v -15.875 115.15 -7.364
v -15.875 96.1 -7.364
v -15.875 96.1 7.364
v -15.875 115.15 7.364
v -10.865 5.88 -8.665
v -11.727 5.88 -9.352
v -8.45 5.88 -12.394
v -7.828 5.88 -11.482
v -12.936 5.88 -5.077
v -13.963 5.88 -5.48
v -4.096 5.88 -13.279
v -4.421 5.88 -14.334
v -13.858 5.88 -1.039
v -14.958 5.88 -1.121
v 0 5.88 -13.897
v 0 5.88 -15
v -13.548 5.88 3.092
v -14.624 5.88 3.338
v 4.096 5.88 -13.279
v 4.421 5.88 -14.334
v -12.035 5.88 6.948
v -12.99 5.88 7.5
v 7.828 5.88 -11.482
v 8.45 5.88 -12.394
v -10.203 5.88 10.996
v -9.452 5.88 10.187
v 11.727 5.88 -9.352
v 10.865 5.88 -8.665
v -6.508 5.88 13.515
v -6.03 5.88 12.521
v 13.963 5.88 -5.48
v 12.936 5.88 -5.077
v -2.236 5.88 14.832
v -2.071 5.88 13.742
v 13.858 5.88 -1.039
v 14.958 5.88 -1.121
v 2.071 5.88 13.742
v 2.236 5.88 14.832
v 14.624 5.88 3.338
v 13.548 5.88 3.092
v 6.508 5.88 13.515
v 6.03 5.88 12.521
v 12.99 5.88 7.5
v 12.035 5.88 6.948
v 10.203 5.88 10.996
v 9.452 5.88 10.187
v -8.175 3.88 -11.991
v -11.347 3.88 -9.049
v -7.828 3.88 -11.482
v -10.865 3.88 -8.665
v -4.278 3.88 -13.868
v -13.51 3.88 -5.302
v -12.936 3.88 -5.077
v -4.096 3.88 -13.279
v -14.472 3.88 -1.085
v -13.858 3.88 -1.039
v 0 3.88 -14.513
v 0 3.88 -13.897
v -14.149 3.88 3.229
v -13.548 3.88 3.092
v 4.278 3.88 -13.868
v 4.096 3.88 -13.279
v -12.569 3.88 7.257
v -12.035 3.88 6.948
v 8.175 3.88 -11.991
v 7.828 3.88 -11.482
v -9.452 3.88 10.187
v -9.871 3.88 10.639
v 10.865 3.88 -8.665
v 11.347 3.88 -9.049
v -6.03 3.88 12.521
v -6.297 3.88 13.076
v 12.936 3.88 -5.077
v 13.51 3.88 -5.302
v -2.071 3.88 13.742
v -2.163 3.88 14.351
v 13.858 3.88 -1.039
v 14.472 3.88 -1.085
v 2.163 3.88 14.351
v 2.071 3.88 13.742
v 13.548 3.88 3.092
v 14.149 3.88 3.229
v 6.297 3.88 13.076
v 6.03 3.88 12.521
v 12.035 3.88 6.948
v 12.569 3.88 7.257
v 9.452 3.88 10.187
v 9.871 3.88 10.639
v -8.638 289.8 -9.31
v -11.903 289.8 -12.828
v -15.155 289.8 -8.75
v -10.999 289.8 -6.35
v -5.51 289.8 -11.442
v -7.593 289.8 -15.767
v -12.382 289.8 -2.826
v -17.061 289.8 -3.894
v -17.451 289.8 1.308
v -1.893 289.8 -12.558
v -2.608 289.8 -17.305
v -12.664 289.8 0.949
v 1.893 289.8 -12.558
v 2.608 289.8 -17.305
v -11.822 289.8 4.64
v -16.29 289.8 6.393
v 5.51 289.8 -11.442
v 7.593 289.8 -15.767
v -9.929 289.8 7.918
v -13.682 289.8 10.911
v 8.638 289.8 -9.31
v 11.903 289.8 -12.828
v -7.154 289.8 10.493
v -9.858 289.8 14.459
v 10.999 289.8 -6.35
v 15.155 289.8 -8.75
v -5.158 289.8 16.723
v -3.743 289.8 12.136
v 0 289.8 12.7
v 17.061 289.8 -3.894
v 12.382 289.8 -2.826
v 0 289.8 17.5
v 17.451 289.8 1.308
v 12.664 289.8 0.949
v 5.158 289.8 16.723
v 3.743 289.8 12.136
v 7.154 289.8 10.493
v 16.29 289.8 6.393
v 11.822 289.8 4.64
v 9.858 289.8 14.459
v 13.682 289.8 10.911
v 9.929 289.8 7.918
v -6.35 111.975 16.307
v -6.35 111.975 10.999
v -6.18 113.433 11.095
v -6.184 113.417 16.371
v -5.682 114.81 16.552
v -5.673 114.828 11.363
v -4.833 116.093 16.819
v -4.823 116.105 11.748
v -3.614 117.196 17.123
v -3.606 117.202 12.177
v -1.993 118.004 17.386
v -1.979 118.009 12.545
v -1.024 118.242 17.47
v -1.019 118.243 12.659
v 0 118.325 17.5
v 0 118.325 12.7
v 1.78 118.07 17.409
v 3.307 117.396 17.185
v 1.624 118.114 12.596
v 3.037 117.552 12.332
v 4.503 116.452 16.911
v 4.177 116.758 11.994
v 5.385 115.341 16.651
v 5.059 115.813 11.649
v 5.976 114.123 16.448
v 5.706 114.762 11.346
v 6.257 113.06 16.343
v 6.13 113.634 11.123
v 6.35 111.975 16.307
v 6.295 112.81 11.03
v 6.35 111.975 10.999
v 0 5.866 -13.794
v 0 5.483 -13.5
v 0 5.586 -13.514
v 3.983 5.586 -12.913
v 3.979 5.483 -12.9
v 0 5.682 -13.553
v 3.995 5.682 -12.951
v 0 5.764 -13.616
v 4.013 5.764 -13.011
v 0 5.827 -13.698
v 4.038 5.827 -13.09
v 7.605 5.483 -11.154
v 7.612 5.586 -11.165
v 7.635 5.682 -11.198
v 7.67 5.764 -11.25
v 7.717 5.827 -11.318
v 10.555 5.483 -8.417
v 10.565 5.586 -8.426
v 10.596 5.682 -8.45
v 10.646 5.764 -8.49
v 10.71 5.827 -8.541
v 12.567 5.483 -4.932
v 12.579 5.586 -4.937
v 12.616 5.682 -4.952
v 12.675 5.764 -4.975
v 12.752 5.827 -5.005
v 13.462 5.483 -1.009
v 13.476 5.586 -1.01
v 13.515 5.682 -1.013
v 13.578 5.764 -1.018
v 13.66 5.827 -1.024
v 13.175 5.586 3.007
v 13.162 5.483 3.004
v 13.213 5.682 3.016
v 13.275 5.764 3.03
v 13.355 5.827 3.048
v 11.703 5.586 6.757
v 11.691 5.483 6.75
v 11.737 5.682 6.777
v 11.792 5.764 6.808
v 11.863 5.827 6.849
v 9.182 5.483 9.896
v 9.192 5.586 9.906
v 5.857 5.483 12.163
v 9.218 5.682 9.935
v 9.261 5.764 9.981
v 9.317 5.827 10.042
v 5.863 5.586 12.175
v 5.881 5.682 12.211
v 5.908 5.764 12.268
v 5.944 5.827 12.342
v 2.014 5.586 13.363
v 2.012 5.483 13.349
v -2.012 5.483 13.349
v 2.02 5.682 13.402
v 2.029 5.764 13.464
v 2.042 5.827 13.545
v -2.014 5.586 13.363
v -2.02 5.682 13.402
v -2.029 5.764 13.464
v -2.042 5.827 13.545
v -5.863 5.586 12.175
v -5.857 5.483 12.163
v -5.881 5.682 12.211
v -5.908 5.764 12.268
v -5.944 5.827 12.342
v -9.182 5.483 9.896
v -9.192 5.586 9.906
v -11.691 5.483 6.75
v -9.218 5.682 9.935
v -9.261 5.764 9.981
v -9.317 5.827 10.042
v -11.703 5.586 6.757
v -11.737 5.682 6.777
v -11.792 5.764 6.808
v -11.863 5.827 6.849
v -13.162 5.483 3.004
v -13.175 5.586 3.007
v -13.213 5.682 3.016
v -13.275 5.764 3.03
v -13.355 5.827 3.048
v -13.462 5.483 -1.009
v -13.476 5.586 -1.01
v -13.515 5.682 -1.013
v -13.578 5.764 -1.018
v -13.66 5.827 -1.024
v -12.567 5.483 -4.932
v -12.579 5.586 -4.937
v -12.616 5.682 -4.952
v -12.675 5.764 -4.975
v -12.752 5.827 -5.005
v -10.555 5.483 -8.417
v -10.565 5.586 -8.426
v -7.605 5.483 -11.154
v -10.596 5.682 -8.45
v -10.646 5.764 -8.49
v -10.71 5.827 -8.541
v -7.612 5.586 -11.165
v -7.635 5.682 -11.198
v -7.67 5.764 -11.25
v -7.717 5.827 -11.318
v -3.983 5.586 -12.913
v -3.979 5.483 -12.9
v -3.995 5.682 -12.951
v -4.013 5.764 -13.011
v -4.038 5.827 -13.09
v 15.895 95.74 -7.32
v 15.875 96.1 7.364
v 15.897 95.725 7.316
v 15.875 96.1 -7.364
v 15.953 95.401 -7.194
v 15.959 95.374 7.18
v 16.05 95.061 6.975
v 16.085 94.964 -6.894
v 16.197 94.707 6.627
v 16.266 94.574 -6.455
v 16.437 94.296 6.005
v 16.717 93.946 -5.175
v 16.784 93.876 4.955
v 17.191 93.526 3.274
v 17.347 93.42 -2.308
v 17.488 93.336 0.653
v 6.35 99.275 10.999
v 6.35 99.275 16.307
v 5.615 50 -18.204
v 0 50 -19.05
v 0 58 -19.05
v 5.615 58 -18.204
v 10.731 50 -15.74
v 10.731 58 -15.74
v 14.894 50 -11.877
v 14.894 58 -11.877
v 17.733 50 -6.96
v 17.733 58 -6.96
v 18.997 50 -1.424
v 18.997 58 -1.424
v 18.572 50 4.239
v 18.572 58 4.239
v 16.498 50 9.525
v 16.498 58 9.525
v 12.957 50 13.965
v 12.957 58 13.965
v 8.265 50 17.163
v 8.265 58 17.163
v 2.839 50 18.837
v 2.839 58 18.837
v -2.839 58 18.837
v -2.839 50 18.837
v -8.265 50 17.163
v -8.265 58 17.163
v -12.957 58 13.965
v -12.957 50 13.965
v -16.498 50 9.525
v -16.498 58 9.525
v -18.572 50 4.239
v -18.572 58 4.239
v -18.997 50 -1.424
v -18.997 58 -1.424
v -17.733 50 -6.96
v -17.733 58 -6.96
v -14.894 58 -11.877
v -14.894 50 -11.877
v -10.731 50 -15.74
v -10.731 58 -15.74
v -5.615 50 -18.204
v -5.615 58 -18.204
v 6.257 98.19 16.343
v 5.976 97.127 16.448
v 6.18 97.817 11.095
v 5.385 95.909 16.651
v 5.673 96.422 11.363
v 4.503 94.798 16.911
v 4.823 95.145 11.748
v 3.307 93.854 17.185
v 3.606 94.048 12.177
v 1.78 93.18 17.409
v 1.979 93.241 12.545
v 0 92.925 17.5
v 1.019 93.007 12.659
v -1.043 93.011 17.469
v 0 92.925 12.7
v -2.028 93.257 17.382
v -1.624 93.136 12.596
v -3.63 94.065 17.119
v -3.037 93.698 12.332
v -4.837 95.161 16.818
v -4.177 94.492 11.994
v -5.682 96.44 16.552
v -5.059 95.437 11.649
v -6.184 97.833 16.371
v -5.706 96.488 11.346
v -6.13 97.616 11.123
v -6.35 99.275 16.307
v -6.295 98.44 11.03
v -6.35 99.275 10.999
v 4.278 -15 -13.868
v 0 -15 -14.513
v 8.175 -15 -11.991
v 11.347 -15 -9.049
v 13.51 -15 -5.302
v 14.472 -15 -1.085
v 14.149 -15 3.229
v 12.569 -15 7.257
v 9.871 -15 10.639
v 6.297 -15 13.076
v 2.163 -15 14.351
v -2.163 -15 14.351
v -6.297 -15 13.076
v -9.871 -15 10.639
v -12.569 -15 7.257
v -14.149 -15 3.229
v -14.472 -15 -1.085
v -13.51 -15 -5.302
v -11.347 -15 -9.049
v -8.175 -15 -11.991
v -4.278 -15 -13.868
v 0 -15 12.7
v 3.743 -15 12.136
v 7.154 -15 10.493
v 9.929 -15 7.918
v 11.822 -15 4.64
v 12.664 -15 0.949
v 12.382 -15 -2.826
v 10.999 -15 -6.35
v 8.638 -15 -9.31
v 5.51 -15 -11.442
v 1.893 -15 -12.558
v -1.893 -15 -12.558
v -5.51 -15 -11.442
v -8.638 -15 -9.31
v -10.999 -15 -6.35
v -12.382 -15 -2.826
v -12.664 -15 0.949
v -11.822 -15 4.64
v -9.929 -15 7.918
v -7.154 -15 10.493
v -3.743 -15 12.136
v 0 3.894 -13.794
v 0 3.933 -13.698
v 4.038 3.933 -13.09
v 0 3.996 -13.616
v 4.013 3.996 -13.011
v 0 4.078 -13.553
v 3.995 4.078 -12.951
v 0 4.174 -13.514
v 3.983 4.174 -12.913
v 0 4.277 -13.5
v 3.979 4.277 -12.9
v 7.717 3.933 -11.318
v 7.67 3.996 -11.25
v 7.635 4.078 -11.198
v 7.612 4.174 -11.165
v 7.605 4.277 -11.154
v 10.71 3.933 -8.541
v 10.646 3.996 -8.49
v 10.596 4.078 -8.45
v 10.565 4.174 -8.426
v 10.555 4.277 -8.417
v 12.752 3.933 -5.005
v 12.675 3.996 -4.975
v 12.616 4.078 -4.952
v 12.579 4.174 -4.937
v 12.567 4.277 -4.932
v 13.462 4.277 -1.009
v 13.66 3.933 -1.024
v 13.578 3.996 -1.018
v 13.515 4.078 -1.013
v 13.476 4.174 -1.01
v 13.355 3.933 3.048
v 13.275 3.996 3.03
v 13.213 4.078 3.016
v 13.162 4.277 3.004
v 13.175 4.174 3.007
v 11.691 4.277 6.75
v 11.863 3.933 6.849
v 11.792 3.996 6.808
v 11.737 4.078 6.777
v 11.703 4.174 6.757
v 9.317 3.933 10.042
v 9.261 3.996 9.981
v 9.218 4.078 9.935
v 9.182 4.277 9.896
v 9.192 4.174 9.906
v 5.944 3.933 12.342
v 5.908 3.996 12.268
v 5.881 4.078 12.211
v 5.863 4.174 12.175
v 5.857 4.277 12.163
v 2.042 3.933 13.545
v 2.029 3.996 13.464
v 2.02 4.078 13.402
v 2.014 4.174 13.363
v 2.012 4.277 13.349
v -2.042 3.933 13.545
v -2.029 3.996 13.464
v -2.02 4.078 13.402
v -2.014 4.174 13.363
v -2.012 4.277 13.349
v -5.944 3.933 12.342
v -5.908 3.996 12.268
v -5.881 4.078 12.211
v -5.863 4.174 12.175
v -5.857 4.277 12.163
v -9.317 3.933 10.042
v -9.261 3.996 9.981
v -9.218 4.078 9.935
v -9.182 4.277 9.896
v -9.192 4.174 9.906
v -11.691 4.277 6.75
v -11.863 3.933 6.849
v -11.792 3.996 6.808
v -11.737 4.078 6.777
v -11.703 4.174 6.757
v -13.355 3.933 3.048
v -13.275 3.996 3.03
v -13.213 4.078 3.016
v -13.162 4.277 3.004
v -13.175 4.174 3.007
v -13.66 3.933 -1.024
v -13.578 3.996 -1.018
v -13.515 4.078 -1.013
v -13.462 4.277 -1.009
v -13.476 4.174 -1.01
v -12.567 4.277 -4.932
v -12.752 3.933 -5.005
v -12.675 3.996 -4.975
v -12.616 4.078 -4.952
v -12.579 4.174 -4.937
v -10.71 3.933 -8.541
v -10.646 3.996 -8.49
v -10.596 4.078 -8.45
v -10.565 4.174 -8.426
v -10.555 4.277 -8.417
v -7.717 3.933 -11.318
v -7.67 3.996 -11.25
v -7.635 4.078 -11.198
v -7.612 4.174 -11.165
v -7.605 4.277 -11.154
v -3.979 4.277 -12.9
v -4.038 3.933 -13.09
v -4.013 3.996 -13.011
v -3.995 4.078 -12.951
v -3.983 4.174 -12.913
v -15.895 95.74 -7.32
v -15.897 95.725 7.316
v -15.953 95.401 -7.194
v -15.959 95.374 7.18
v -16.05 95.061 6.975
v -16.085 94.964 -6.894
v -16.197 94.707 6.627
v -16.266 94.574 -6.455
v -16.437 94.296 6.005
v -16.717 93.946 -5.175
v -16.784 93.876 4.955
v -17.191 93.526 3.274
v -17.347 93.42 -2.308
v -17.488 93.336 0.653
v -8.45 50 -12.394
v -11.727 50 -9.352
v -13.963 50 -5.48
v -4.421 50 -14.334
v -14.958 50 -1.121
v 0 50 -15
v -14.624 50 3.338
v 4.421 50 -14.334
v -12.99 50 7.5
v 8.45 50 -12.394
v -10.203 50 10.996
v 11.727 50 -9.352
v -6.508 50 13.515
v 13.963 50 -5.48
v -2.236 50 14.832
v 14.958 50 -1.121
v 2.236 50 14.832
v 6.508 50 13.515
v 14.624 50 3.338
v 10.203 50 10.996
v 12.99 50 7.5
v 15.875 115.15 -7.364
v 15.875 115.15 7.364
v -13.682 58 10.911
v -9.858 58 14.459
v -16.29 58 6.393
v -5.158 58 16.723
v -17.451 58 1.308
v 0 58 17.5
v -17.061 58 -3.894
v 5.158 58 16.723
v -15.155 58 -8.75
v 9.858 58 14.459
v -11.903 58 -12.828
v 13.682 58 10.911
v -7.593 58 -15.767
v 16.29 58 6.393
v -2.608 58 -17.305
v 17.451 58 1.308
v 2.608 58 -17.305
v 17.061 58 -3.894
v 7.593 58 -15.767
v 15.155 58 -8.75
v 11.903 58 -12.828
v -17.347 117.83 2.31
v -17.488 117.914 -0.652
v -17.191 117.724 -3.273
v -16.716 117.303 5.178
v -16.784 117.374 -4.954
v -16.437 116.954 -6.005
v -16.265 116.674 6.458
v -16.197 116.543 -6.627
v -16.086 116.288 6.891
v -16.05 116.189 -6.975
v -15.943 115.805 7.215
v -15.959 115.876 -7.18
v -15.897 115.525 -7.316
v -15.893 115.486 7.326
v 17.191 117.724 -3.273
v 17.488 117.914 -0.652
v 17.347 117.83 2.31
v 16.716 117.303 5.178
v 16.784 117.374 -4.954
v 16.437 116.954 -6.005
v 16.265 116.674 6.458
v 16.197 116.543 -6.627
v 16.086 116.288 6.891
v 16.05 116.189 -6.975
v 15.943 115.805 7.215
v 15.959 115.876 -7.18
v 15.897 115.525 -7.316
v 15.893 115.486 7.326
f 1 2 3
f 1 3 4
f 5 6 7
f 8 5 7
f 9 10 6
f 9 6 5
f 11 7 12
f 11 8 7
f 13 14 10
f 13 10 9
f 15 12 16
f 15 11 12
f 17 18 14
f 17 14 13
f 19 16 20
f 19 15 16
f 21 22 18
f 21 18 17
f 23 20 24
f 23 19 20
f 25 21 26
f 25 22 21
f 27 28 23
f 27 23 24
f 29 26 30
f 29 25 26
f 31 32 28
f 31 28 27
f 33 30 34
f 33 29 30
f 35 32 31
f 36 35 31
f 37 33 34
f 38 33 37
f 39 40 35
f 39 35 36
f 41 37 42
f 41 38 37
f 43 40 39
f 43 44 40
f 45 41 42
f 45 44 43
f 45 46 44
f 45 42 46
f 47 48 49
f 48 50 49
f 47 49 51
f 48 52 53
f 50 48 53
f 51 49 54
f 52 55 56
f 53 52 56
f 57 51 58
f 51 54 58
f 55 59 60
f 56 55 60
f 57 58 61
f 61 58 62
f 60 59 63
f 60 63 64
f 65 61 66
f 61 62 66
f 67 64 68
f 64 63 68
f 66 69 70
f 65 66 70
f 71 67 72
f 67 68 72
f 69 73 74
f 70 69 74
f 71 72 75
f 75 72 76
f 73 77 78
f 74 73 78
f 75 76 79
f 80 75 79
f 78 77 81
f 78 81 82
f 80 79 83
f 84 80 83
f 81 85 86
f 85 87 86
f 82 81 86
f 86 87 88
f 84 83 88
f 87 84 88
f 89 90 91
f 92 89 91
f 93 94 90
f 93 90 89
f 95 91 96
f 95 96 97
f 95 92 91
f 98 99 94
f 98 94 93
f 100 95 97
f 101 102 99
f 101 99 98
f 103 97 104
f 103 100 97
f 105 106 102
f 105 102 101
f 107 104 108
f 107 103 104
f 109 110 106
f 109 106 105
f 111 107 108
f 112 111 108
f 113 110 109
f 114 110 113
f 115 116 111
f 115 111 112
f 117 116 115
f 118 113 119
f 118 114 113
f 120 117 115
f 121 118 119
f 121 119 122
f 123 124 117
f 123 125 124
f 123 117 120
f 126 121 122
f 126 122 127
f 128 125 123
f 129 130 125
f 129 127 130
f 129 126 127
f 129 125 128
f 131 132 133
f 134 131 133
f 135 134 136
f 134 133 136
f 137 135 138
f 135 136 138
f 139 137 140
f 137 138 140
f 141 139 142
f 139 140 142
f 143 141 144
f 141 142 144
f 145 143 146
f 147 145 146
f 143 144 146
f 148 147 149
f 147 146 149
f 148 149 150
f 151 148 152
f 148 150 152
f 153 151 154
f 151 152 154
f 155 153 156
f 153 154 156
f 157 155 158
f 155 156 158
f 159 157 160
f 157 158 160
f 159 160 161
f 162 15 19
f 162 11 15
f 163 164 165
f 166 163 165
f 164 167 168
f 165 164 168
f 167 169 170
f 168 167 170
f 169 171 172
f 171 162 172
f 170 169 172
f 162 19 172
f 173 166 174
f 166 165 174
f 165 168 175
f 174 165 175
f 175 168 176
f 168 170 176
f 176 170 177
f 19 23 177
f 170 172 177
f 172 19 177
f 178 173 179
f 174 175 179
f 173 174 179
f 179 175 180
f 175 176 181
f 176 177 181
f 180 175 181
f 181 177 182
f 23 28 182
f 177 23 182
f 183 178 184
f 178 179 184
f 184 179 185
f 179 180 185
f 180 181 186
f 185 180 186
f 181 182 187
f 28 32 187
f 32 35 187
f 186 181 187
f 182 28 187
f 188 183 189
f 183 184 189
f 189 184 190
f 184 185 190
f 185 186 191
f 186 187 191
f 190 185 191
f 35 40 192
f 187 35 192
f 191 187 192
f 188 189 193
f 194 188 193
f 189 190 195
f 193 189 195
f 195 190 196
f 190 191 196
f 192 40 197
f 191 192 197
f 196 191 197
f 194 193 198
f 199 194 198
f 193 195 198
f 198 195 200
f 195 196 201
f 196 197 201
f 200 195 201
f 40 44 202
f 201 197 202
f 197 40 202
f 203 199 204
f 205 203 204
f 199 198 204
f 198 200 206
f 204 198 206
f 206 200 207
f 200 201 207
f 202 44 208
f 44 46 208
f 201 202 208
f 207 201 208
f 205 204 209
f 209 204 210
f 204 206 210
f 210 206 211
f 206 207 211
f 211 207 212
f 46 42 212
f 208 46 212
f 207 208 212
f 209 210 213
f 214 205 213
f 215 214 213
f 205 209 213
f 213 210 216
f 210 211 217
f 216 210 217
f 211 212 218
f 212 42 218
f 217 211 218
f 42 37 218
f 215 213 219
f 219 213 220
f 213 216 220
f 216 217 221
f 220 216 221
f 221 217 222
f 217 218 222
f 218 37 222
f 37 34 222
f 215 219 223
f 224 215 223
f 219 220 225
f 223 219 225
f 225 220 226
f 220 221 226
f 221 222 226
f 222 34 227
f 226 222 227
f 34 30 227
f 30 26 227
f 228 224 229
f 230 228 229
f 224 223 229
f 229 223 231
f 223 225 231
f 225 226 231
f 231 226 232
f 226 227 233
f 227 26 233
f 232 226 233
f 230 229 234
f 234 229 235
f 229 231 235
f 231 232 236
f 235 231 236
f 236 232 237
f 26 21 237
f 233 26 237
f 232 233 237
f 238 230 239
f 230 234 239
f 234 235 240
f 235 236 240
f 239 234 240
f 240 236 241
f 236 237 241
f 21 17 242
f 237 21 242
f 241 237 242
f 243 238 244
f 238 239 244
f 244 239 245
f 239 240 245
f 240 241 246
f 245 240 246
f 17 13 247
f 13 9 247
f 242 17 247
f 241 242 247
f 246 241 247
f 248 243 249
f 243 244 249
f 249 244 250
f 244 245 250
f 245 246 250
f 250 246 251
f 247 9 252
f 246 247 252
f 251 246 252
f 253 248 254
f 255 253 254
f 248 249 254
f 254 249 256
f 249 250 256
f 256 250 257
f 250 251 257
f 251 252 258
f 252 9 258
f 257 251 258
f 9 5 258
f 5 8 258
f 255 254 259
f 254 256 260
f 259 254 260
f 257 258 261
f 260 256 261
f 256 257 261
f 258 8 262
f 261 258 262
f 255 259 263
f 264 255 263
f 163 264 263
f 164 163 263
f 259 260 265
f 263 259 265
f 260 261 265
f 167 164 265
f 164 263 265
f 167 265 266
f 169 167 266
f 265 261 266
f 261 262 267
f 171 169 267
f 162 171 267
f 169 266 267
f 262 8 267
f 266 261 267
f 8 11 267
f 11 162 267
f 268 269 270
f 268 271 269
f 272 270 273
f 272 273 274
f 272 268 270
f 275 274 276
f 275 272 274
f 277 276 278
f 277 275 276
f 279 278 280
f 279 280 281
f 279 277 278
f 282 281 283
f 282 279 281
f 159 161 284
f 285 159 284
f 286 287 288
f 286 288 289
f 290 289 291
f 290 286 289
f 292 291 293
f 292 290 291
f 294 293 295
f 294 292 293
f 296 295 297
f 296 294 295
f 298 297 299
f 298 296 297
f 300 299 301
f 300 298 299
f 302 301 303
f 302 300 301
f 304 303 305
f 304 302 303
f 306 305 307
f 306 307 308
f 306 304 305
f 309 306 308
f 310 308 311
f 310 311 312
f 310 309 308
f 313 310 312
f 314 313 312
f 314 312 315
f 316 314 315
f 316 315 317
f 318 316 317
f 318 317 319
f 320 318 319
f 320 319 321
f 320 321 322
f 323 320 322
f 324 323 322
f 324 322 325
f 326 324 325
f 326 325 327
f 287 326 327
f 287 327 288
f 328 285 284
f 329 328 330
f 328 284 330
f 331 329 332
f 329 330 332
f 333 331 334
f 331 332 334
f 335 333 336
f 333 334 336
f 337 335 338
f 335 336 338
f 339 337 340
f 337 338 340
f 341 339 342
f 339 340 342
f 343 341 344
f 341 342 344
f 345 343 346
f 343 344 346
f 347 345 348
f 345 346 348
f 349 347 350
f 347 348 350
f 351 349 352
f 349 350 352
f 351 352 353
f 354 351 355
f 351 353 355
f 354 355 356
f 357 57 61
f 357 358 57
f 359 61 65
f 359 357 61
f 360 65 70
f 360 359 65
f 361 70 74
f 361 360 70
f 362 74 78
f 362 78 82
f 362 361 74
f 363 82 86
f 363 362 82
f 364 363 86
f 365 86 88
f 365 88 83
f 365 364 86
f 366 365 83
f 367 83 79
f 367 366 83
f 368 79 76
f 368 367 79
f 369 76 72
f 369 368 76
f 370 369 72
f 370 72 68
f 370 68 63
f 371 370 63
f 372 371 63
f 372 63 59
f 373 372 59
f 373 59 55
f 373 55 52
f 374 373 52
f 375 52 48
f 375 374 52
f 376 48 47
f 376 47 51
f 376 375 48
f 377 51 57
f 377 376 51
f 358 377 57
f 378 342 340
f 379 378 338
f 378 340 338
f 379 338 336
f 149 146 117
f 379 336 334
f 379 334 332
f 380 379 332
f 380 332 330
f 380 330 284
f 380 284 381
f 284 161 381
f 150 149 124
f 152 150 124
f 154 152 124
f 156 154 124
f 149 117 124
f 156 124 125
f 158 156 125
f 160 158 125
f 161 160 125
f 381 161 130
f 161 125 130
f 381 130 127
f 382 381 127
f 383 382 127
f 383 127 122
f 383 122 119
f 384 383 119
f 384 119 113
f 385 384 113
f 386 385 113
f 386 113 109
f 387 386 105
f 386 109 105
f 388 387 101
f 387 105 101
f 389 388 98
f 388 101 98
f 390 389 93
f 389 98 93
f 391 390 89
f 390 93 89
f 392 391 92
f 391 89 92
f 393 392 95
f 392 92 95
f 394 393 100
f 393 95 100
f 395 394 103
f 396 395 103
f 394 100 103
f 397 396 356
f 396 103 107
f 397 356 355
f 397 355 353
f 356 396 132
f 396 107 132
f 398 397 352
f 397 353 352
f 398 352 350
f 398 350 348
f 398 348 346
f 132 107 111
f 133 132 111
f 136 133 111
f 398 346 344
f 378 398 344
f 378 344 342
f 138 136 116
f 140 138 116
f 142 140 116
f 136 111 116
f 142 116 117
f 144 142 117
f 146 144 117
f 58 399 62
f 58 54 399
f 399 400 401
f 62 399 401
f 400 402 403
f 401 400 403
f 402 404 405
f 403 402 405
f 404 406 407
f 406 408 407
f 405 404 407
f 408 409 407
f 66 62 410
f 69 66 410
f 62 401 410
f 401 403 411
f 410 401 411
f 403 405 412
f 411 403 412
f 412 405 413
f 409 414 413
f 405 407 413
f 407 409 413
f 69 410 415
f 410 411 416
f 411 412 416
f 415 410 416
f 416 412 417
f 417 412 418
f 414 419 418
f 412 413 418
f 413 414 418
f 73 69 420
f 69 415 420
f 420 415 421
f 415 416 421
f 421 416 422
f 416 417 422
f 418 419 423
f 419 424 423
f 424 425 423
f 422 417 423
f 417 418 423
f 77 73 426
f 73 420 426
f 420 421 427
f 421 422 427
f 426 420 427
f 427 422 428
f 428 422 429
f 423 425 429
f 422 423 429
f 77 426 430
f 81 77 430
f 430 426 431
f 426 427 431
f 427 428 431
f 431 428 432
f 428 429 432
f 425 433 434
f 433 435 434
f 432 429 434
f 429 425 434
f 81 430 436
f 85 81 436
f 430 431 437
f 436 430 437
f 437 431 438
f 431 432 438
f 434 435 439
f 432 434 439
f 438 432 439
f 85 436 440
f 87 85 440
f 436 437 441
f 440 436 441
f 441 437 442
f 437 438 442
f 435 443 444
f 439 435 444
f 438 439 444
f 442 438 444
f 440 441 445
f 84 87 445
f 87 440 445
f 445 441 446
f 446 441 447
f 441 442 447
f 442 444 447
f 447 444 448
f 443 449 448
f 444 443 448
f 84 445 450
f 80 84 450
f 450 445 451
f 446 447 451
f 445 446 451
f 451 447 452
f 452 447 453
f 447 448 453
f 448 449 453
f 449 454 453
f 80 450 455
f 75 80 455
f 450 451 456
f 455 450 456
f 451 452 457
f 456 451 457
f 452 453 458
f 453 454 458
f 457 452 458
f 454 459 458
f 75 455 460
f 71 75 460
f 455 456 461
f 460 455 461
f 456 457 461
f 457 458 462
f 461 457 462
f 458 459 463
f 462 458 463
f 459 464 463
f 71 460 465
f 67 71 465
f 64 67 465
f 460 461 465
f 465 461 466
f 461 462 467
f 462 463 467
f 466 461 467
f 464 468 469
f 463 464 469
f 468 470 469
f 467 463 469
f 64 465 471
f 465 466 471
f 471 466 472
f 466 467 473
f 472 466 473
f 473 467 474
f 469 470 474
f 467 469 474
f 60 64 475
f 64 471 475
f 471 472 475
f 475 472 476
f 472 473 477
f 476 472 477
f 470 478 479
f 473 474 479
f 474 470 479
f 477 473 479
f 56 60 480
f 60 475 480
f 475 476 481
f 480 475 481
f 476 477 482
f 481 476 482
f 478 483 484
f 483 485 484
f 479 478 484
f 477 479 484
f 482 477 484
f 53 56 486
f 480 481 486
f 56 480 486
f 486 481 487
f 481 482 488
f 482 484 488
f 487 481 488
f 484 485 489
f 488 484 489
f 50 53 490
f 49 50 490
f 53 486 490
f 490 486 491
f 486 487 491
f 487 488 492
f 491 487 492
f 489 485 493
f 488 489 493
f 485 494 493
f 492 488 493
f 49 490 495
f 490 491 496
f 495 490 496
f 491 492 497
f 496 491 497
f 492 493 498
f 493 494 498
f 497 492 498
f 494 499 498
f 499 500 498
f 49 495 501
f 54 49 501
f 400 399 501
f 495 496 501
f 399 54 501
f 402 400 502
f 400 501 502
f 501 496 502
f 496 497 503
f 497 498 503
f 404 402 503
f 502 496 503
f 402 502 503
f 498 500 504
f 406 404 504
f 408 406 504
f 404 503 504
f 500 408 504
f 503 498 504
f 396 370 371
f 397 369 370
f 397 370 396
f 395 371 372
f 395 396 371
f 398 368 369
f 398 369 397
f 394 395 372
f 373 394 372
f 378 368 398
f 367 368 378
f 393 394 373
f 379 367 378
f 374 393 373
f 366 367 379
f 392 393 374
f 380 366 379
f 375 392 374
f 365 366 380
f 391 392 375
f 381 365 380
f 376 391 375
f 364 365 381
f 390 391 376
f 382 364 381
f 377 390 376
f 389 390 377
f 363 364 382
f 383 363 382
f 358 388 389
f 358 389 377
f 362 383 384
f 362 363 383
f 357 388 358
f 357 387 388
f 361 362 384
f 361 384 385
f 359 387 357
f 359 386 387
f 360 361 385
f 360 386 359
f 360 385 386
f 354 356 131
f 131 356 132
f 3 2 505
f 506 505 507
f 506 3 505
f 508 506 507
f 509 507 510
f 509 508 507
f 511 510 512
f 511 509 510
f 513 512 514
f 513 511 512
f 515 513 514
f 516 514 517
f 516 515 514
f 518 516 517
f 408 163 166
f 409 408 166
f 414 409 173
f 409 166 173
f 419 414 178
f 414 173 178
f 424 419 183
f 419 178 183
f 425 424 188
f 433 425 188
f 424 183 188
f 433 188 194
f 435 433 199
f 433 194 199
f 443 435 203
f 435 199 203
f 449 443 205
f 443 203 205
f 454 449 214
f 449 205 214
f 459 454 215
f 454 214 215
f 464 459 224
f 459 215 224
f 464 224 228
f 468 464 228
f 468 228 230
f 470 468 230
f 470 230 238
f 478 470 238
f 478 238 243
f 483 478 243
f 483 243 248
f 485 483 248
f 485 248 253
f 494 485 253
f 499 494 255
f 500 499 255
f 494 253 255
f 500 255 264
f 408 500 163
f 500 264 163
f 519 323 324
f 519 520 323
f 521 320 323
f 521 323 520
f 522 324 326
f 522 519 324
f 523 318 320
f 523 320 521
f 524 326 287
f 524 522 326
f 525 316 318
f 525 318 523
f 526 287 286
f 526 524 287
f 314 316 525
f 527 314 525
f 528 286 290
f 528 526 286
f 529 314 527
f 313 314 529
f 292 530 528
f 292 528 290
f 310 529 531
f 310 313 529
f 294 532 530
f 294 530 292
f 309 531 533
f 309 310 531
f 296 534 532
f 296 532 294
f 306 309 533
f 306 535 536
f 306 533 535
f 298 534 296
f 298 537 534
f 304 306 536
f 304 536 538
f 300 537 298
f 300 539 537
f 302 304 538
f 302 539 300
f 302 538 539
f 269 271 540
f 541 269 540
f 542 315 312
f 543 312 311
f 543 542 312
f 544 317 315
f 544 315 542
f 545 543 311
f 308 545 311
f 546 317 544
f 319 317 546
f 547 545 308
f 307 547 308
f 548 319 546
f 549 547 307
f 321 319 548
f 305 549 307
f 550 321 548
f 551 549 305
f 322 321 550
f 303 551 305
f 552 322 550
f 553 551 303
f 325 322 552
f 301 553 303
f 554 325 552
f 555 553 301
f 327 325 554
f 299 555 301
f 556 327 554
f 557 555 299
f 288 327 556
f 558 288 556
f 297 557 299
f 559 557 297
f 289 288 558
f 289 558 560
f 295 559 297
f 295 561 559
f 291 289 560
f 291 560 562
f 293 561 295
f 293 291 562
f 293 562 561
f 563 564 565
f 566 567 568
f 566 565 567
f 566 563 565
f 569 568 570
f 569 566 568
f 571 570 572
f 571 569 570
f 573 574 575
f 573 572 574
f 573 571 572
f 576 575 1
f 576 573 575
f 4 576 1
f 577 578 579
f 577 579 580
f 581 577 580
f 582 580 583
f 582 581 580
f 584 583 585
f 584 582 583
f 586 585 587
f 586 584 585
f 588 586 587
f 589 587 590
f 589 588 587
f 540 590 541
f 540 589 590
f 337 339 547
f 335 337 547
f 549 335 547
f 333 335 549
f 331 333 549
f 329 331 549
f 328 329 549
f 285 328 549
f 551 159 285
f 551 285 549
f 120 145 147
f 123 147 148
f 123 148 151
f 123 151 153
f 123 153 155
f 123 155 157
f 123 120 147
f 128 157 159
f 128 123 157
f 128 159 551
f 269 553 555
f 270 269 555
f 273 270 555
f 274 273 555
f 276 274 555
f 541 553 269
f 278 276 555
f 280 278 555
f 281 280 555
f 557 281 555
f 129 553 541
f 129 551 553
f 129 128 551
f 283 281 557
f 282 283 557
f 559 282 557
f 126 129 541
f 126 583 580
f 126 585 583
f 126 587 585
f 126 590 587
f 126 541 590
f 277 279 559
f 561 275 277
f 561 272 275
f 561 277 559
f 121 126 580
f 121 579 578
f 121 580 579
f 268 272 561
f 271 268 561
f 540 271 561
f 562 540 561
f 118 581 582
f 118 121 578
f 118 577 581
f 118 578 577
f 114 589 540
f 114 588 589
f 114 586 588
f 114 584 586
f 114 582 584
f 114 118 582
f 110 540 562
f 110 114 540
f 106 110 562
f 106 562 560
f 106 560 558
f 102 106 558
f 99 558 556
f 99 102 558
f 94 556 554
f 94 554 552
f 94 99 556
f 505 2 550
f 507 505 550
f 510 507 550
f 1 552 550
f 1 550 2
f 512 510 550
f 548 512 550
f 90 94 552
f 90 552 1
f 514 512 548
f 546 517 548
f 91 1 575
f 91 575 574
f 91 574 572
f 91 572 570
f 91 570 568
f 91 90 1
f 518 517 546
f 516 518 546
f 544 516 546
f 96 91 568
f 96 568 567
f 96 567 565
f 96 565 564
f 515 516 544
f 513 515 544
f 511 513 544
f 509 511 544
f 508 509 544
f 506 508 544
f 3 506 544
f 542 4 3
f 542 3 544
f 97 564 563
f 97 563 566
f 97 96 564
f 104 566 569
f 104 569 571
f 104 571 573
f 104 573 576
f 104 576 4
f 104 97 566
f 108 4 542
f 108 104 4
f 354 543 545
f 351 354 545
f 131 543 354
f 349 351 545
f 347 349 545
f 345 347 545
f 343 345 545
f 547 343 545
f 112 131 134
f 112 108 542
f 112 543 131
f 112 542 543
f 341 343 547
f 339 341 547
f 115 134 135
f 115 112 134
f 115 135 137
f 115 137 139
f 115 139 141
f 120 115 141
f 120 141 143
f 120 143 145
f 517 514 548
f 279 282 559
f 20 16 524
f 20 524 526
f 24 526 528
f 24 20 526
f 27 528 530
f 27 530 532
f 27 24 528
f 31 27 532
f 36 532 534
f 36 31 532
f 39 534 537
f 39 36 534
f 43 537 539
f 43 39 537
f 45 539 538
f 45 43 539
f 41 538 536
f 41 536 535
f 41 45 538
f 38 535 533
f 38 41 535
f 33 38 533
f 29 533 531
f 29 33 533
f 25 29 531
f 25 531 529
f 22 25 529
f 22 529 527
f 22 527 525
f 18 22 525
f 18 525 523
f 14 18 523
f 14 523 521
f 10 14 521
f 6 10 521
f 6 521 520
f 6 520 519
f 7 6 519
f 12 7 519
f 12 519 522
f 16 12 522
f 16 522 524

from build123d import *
from build123d.topology import SkipClean

# Parameters (mm, degrees)
SKETCH1_R               = 22.5
SKETCH1_R_2             = 9.525
BOSS_EXTRUDE1_DEPTH     = 95
SKETCH2_OUTSIDE_W       = 69.87
SKETCH2_OUTSIDE_H       = 69.87
SKETCH2_OUTSIDE_R       = 15
CUT_EXTRUDE1_DEPTH      = 50
SKETCH4_OUTSIDE_W       = 69.87
SKETCH4_OUTSIDE_H       = 69.87
SKETCH4_OUTSIDE_R       = 17.5
CUT_EXTRUDE2_DEPTH      = 37
SKETCH11_OUTSIDE_W      = 69.87
SKETCH11_OUTSIDE_H      = 69.87
SKETCH11_OUTSIDE_R      = 14.513
CUT_EXTRUDE3_DEPTH      = 5.88
SKETCH12_R              = 17.5
SKETCH12_R_2            = 9.525
BOSS_EXTRUDE2_DEPTH     = 203.2
BOSS_EXTRUDE3_START     = 15
SKETCH13_R              = 14.513
SKETCH13_R_2            = 9.525
BOSS_EXTRUDE3_DEPTH     = 15
SKETCH15_OUTSIDE_W      = 110.92
SKETCH15_OUTSIDE_H      = 110.92
SKETCH15_OUTSIDE_R      = 19.05
CUT_EXTRUDE5_DEPTH      = 251.231372933
SKETCH16_OUTSIDE_W      = 103.66
SKETCH16_OUTSIDE_H      = 103.66
SKETCH16_OUTSIDE_R      = 13.5
CUT_EXTRUDE6_DEPTH      = 2
FILLET2_R               = 0.396875
SKETCH17_R              = 17.5
CUT_EXTRUDE7_DEPTH      = 8.4
CUT_EXTRUDE8_DEPTH      = 292.049557636
CUT_EXTRUDE8_DEPTH_BACK = 292.049557636
SKETCH20_W              = 3.175
SKETCH20_H              = 25.4
FILLET3_R               = 3.175
CUT_EXTRUDE9_REACH      = 293.05
CUT_EXTRUDE9_END_RADIUS = 17.5
CUT_EXTRUDE10_REACH     = 307.988
SKETCH22_R              = 12.7


with BuildPart() as part:
    # Sketch1 → Boss-Extrude1 (new body)
    with BuildSketch(Plane(origin=(0, 0, 0), x_dir=(1, 0, 0), z_dir=(0, 1, 0))):
        with Locations(Location((0, 0, 0), (0, 0, 270))):
            Circle(SKETCH1_R)
        with Locations(Location((0, 0, 0), (0, 0, 270))):
            Circle(SKETCH1_R_2, mode=Mode.SUBTRACT)
    extrude(amount=BOSS_EXTRUDE1_DEPTH)

    # Sketch2 outside → Cut-Extrude1 (cut)
    with BuildSketch(Plane.XZ):
        Rectangle(SKETCH2_OUTSIDE_W, SKETCH2_OUTSIDE_H)
        with Locations(Location((0, 0, 0), (0, 0, 270))):
            Circle(SKETCH2_OUTSIDE_R, mode=Mode.SUBTRACT)
    extrude(amount=-CUT_EXTRUDE1_DEPTH, mode=Mode.SUBTRACT)

    # Sketch4 outside → Cut-Extrude2 (cut)
    with BuildSketch(Plane(origin=(0, 95, 0), x_dir=(1, 0, 0), z_dir=(0, 1, 0))):
        Rectangle(SKETCH4_OUTSIDE_W, SKETCH4_OUTSIDE_H)
        with Locations(Location((0, 0, 0), (0, 0, 270))):
            Circle(SKETCH4_OUTSIDE_R, mode=Mode.SUBTRACT)
    extrude(amount=-CUT_EXTRUDE2_DEPTH, mode=Mode.SUBTRACT)

    # Sketch11 outside → Cut-Extrude3 (cut)
    with BuildSketch(Plane.XZ):
        Rectangle(SKETCH11_OUTSIDE_W, SKETCH11_OUTSIDE_H)
        with Locations(Location((0, 0, 0), (0, 0, 270))):
            Circle(SKETCH11_OUTSIDE_R, mode=Mode.SUBTRACT)
    extrude(amount=-CUT_EXTRUDE3_DEPTH, mode=Mode.SUBTRACT)

    # Sketch12 → Boss-Extrude2 (add)
    with BuildSketch(Plane(origin=(0, 95, 0), x_dir=(1, 0, 0), z_dir=(0, 1, 0))):
        with Locations(Location((0, 0, 0), (0, 0, 270))):
            Circle(SKETCH12_R)
        with Locations(Location((0, 0, 0), (0, 0, 270))):
            Circle(SKETCH12_R_2, mode=Mode.SUBTRACT)
    extrude(amount=BOSS_EXTRUDE2_DEPTH)

    # Sketch13 → Boss-Extrude3 (add)
    with SkipClean():  # the faces are left unmerged after this step: merging them gives an invalid solid
        with BuildSketch(Plane.XZ.offset(BOSS_EXTRUDE3_START)):
            with Locations(Location((0, 0, 0), (0, 0, 270))):
                Circle(SKETCH13_R)
            with Locations(Location((0, 0, 0), (0, 0, 270))):
                Circle(SKETCH13_R_2, mode=Mode.SUBTRACT)
        extrude(amount=-BOSS_EXTRUDE3_DEPTH)

    # Sketch15 outside → Cut-Extrude5 (cut, through all)
    with SkipClean():  # the faces are left unmerged after this step: merging them gives an invalid solid
        with BuildSketch(Plane.XZ.offset(-50)):
            Rectangle(SKETCH15_OUTSIDE_W, SKETCH15_OUTSIDE_H)
            with Locations(Location((0, 0, 0), (0, 0, 270))):
                Circle(SKETCH15_OUTSIDE_R, mode=Mode.SUBTRACT)
        extrude(amount=-CUT_EXTRUDE5_DEPTH, mode=Mode.SUBTRACT)

    # Sketch16 outside → Cut-Extrude6 (cut)
    with SkipClean():  # the faces are left unmerged after this step: merging them gives an invalid solid
        with BuildSketch(Plane.XZ.offset(-5.88)):
            Rectangle(SKETCH16_OUTSIDE_W, SKETCH16_OUTSIDE_H)
            with Locations(Location((0, 0, 0), (0, 0, 270))):
                Circle(SKETCH16_OUTSIDE_R, mode=Mode.SUBTRACT)
        extrude(amount=CUT_EXTRUDE6_DEPTH, mode=Mode.SUBTRACT)

    # Fillet2
    fillet2_edges = [part.edges().sort_by_distance(p)[0] for p in [
        (0, 5.88, 13.5),
        (0, 3.88, 13.5),
    ]]
    fillet(fillet2_edges, radius=FILLET2_R)

    # Sketch17 → Cut-Extrude7 (cut)
    with BuildSketch(Plane(origin=(0, 298.2, 0), x_dir=(1, 0, 0), z_dir=(0, 1, 0))):
        with Locations(Location((0, 0, 0), (0, 0, 270))):
            Circle(SKETCH17_R)
    extrude(amount=-CUT_EXTRUDE7_DEPTH, mode=Mode.SUBTRACT)

    # Sketch20 → Cut-Extrude8 (cut, two sides: drawn at the far end of the back side and taken through both)
    with BuildSketch(Plane.XY.offset(-CUT_EXTRUDE8_DEPTH_BACK)):
        with Locations((-17.4625, 105.625)):
            Rectangle(SKETCH20_W, SKETCH20_H)
        with Locations((17.4625, 105.625)):
            Rectangle(SKETCH20_W, SKETCH20_H)
    extrude(amount=CUT_EXTRUDE8_DEPTH + CUT_EXTRUDE8_DEPTH_BACK, mode=Mode.SUBTRACT)

    # Fillet3
    # the kernel refuses this fillet: 3.175 mm, written as the material it adds along each edge
    with BuildSketch(Plane(origin=(-15.875, 92.925, 15.301899161), x_dir=(0, 1, 0), z_dir=(0, 0, -1))) as fillet3_piece_1_section:
        with BuildLine():
            CenterArc((FILLET3_R, -FILLET3_R), FILLET3_R, 90, 90)
            Line((0, -FILLET3_R), (0, 0))
            Line((0, 0), (FILLET3_R, 0))
        make_face()
    fillet3_piece_1 = extrude(amount=30.603798322, mode=Mode.PRIVATE)
    fillet3_piece_1 = fillet3_piece_1 & Plane(origin=(0, 93.819377515, 0), x_dir=(0, 0, 1), z_dir=(0, 1, 0)) * Cylinder(17.5, 74, mode=Mode.PRIVATE)
    add(fillet3_piece_1)
    with BuildSketch(Plane(origin=(-15.875, 118.325, 15.301899161), x_dir=(0, -1, 0), z_dir=(0, 0, -1))) as fillet3_piece_2_section:
        with BuildLine():
            CenterArc((FILLET3_R, FILLET3_R), FILLET3_R, 180, 90)
            Line((0, FILLET3_R), (0, 0))
            Line((0, 0), (FILLET3_R, 0))
        make_face()
    fillet3_piece_2 = extrude(amount=30.603798322, mode=Mode.PRIVATE)
    fillet3_piece_2 = fillet3_piece_2 & Plane(origin=(0, 117.430622485, 0), x_dir=(0, 0, 1), z_dir=(0, 1, 0)) * Cylinder(17.5, 74, mode=Mode.PRIVATE)
    add(fillet3_piece_2)
    with BuildSketch(Plane(origin=(15.875, 92.925, -15.301899161), x_dir=(0, 1, 0), z_dir=(0, 0, 1))) as fillet3_piece_3_section:
        with BuildLine():
            CenterArc((FILLET3_R, -FILLET3_R), FILLET3_R, 90, 90)
            Line((0, -FILLET3_R), (0, 0))
            Line((0, 0), (FILLET3_R, 0))
        make_face()
    fillet3_piece_3 = extrude(amount=30.603798322, mode=Mode.PRIVATE)
    fillet3_piece_3 = fillet3_piece_3 & Plane(origin=(0, 93.81935464, 0), x_dir=(0, 0, 1), z_dir=(0, 1, 0)) * Cylinder(17.5, 74, mode=Mode.PRIVATE)
    add(fillet3_piece_3)
    with BuildSketch(Plane(origin=(15.875, 118.325, -15.301899161), x_dir=(0, -1, 0), z_dir=(0, 0, 1))) as fillet3_piece_4_section:
        with BuildLine():
            CenterArc((FILLET3_R, FILLET3_R), FILLET3_R, 180, 90)
            Line((0, FILLET3_R), (0, 0))
            Line((0, 0), (FILLET3_R, 0))
        make_face()
    fillet3_piece_4 = extrude(amount=30.603798322, mode=Mode.PRIVATE)
    fillet3_piece_4 = fillet3_piece_4 & Plane(origin=(0, 117.43064536, 0), x_dir=(0, 0, 1), z_dir=(0, 1, 0)) * Cylinder(17.5, 74, mode=Mode.PRIVATE)
    add(fillet3_piece_4)

    # Cut-Extrude9: up to this cylinder (the profile starts inside it)
    cut_extrude9_end = Plane(origin=(0, 105.625, 0), z_dir=(0, 1, 0)) * Cylinder(CUT_EXTRUDE9_END_RADIUS, 622.1, mode=Mode.PRIVATE)
    # Sketch21 → Cut-Extrude9 (cut, up to the surface)
    with BuildSketch(Plane.XY, mode=Mode.PRIVATE) as cut_extrude9_sk1:
        with BuildLine():
            Line((-6.35, 99.275), (-6.35, 111.975))
            ThreePointArc((-6.35, 111.975), (0, 118.325), (6.35, 111.975))
            Line((6.35, 111.975), (6.35, 99.275))
            ThreePointArc((6.35, 99.275), (0, 92.925), (-6.35, 99.275))
        make_face()
    cut_extrude9_tool1 = extrude(cut_extrude9_sk1.sketch, amount=CUT_EXTRUDE9_REACH, mode=Mode.PRIVATE) & cut_extrude9_end
    add(cut_extrude9_tool1.solids().sort_by_distance((0, 105.625, 0))[0], mode=Mode.SUBTRACT)

    # Cut-Extrude10: up to this face of the body (flat: up to its plane)
    cut_extrude10_end = Plane(part.part.faces().sort_by_distance((0, -15, 14.102510371))[0])
    # Sketch22 → Cut-Extrude10 (cut, up to the picked face)
    with BuildSketch(Plane(origin=(0, 289.8, 0), x_dir=(1, 0, 0), z_dir=(0, 1, 0)), mode=Mode.PRIVATE) as cut_extrude10_sk1:
        with Locations(Location((0, 0, 0), (0, 0, 270))):
            Circle(SKETCH22_R)
    cut_extrude10_tool1 = split(extrude(cut_extrude10_sk1.sketch, amount=-CUT_EXTRUDE10_REACH, mode=Mode.PRIVATE), bisect_by=cut_extrude10_end, keep=Keep.BOTH, mode=Mode.PRIVATE)
    add(cut_extrude10_tool1.solids().sort_by(Axis((0, 289.8, 0), (0, -1, 0)))[0], mode=Mode.SUBTRACT)


solid = part.part
